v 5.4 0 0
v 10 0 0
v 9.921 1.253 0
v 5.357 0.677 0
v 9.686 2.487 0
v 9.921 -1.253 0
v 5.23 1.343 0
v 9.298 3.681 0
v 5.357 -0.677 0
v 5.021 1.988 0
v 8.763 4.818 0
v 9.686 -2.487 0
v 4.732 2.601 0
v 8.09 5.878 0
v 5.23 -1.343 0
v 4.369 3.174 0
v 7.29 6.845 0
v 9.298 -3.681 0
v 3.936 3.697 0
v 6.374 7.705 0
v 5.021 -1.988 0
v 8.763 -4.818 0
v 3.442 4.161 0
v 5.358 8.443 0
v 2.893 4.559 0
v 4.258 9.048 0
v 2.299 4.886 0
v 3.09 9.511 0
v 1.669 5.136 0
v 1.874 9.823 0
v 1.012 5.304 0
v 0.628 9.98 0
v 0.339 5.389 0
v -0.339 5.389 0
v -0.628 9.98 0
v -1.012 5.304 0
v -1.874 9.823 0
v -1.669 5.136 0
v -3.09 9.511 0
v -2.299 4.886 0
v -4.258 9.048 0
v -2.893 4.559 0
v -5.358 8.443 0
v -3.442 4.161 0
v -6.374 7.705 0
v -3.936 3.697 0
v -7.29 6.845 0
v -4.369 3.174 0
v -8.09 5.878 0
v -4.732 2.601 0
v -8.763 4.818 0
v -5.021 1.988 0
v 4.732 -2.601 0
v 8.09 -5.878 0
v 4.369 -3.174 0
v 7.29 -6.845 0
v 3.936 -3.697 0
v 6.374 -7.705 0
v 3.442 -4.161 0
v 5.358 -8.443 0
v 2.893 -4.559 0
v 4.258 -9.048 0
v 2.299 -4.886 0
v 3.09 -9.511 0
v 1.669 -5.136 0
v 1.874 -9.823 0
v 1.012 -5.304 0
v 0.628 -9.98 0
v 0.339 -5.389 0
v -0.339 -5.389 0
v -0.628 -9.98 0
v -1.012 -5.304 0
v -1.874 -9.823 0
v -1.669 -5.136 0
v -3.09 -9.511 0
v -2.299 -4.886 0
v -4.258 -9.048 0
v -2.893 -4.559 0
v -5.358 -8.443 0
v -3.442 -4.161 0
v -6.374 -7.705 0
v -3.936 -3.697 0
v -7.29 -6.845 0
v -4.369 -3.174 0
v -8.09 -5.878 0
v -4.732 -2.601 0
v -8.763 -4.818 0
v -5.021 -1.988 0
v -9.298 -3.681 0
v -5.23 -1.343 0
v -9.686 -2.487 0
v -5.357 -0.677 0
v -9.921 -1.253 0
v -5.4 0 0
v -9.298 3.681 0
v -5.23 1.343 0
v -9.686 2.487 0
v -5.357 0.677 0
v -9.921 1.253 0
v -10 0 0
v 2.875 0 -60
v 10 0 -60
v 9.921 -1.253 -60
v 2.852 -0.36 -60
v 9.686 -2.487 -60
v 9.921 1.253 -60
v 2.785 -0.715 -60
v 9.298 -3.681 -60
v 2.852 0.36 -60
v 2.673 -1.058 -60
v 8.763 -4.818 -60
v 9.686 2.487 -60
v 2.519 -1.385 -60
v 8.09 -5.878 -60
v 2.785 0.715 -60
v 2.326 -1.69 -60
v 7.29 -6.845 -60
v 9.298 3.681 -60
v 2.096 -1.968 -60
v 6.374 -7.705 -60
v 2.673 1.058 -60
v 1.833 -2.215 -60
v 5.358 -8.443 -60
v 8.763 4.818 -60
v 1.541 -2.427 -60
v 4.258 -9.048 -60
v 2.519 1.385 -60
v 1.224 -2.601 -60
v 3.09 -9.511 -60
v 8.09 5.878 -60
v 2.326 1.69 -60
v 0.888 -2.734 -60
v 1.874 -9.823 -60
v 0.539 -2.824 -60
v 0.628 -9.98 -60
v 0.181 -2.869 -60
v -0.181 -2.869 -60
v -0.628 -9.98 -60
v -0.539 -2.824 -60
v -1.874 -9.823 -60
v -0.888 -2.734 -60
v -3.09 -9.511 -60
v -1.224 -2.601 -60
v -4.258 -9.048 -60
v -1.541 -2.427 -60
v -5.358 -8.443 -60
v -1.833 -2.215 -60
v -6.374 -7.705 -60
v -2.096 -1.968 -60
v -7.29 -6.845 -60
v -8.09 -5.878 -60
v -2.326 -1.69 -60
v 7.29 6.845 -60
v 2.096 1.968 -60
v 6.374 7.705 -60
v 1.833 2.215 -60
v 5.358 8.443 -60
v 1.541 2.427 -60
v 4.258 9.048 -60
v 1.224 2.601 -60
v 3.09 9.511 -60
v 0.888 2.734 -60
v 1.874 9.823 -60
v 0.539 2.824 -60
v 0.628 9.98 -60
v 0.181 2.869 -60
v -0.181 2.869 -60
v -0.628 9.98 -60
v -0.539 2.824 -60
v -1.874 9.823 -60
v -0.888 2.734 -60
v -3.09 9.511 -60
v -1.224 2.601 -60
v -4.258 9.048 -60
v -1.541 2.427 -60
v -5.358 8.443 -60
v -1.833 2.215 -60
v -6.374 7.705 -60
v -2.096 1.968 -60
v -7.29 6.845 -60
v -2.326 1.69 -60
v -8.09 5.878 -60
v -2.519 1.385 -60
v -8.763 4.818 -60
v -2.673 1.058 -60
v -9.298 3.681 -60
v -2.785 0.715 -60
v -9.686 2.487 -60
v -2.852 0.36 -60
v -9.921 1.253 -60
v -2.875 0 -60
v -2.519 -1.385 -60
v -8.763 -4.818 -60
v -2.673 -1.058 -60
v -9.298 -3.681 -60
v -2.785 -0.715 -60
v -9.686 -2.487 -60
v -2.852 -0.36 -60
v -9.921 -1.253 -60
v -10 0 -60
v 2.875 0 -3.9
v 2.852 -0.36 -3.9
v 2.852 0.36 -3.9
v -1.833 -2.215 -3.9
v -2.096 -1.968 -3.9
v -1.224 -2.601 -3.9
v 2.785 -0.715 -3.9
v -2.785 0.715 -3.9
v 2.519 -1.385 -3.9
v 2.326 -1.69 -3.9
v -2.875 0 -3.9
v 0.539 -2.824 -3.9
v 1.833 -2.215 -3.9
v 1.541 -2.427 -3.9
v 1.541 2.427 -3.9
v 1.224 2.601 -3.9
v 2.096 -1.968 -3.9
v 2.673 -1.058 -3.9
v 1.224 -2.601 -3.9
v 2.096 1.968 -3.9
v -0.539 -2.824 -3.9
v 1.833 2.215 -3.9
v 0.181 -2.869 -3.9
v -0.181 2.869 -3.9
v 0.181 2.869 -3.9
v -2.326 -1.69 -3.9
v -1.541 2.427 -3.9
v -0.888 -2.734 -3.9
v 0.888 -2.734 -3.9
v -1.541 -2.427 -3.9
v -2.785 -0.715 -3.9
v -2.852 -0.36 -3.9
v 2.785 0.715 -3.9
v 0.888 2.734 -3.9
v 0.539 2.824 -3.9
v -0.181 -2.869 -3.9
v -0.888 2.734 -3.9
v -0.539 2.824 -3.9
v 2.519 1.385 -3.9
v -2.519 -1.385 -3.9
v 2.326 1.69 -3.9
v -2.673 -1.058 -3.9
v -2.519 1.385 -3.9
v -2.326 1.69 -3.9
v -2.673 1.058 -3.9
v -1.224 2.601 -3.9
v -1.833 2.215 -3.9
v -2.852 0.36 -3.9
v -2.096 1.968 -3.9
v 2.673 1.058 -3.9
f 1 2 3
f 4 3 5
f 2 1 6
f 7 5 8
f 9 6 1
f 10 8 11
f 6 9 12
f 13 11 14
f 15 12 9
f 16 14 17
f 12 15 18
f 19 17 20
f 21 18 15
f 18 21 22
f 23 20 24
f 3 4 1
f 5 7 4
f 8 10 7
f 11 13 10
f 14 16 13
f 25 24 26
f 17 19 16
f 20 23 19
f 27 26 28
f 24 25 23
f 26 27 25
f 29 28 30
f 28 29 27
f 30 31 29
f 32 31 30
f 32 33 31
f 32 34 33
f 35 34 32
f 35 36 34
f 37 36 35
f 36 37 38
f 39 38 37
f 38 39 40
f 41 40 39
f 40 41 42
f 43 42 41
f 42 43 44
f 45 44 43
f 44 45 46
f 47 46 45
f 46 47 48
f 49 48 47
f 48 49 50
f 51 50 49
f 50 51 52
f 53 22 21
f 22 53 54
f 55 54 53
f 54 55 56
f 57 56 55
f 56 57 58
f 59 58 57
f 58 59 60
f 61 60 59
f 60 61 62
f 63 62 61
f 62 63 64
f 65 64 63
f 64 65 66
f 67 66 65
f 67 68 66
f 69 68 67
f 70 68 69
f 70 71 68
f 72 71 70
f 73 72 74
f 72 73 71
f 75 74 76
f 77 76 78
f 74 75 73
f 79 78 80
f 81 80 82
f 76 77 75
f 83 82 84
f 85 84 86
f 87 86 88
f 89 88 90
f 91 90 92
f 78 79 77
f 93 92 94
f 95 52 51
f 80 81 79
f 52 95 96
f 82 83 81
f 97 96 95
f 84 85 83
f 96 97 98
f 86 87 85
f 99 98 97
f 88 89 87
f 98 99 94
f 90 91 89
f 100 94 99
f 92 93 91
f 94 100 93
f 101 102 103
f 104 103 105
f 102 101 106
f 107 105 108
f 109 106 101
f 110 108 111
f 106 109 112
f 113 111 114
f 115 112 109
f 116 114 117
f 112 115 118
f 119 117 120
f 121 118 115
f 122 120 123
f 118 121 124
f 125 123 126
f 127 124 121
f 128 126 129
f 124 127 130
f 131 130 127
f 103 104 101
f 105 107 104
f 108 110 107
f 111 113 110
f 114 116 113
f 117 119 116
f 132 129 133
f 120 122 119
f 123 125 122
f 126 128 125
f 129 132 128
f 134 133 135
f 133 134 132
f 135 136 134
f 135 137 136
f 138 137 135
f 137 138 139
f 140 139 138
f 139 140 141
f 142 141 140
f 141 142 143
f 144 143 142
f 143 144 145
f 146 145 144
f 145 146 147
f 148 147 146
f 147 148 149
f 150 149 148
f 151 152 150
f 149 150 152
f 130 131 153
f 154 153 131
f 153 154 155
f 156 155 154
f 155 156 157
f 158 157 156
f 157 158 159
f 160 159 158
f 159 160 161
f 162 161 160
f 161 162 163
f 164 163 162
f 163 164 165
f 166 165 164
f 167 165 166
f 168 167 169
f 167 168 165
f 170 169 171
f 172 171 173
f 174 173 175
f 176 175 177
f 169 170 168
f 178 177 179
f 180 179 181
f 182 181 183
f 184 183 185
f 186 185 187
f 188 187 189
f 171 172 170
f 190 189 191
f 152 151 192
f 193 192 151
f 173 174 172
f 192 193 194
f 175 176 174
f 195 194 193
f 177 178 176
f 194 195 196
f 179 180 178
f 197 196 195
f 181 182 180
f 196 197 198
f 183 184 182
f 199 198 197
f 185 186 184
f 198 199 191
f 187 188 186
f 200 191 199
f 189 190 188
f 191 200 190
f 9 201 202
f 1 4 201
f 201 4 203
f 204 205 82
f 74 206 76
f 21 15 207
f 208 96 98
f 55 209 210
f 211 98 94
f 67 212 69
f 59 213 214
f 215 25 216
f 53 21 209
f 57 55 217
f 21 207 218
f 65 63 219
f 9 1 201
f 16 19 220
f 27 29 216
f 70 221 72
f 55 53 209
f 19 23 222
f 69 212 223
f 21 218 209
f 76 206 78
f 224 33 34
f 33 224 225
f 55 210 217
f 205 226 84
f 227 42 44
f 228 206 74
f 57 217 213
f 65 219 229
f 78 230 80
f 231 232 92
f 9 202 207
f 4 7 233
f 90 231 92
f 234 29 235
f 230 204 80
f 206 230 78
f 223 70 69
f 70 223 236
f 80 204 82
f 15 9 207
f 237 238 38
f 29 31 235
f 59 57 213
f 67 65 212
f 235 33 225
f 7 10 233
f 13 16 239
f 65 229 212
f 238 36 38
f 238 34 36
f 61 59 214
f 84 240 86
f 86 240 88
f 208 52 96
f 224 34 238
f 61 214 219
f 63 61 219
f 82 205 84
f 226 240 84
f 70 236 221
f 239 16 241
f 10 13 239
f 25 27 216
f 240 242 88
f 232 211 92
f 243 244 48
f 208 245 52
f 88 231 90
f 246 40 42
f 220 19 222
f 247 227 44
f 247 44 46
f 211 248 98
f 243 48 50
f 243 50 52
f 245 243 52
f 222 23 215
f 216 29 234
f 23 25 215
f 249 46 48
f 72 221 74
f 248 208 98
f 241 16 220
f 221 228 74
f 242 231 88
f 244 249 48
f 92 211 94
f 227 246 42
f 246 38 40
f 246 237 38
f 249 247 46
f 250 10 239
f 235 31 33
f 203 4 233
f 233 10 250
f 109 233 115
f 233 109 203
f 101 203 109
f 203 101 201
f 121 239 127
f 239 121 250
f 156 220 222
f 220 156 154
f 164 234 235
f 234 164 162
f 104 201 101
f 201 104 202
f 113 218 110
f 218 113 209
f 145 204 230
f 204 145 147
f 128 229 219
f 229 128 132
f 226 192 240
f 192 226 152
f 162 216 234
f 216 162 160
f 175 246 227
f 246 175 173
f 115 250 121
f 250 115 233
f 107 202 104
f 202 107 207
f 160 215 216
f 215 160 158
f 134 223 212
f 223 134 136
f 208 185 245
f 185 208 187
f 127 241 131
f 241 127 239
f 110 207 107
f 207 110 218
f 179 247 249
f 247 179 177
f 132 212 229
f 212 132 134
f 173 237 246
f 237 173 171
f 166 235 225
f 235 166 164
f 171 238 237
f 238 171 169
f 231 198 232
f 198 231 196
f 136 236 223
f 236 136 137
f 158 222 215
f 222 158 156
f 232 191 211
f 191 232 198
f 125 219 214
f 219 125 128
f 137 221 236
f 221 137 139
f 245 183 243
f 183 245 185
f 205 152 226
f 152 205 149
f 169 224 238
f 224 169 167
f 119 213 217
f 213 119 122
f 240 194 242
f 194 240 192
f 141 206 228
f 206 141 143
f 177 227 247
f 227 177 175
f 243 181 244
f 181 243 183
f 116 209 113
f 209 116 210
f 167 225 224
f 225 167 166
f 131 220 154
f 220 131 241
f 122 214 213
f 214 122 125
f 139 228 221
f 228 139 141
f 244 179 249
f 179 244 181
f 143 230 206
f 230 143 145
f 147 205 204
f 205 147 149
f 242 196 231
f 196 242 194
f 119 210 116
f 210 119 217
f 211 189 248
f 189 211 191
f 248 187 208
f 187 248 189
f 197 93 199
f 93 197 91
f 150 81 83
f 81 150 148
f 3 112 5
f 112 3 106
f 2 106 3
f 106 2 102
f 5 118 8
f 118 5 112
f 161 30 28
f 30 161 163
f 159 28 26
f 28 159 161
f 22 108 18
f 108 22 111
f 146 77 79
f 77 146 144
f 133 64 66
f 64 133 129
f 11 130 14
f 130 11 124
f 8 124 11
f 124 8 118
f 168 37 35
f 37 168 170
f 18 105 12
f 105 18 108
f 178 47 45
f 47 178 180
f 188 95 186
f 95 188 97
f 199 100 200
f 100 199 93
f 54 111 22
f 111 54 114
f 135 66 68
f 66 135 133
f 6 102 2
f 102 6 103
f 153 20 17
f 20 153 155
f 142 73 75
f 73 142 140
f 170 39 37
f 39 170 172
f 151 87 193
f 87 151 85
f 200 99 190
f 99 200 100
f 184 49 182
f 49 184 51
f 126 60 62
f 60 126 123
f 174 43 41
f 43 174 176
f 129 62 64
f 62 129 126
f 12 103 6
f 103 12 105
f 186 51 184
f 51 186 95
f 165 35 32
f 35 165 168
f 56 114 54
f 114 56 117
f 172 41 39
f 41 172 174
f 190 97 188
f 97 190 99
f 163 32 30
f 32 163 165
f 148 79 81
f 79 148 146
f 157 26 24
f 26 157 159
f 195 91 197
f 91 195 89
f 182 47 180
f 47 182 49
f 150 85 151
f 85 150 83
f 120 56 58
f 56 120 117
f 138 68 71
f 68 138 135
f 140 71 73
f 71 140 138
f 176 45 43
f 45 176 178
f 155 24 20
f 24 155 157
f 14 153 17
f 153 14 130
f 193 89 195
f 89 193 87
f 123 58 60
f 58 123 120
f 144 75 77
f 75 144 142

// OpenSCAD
$fn = 50;


difference() {
	union() {
		translate(v = [0, 0, -60.0000000000]) {
			cylinder(h = 60, r = 10.0000000000);
		}
		cylinder(h = 0, r = 16.0000000000);
	}
	union() {
		translate(v = [0, 0, 0]) {
			rotate(a = [0, 0, 0]) {
				difference() {
					union() {
						#translate(v = [0, 0, -60.0000000000]) {
							cylinder(h = 60, r = 2.6000000000);
						}
						#translate(v = [0, 0, -3.9000000000]) {
							cylinder(h = 3.9000000000, r1 = 2.8750000000, r2 = 5.4000000000);
						}
						#translate(v = [0, 0, -60.0000000000]) {
							cylinder(h = 60, r = 2.8750000000);
						}
						#translate(v = [0, 0, -60.0000000000]) {
							cylinder(h = 60, r = 2.6000000000);
						}
					}
					union();
				}
			}
		}
	}
}
